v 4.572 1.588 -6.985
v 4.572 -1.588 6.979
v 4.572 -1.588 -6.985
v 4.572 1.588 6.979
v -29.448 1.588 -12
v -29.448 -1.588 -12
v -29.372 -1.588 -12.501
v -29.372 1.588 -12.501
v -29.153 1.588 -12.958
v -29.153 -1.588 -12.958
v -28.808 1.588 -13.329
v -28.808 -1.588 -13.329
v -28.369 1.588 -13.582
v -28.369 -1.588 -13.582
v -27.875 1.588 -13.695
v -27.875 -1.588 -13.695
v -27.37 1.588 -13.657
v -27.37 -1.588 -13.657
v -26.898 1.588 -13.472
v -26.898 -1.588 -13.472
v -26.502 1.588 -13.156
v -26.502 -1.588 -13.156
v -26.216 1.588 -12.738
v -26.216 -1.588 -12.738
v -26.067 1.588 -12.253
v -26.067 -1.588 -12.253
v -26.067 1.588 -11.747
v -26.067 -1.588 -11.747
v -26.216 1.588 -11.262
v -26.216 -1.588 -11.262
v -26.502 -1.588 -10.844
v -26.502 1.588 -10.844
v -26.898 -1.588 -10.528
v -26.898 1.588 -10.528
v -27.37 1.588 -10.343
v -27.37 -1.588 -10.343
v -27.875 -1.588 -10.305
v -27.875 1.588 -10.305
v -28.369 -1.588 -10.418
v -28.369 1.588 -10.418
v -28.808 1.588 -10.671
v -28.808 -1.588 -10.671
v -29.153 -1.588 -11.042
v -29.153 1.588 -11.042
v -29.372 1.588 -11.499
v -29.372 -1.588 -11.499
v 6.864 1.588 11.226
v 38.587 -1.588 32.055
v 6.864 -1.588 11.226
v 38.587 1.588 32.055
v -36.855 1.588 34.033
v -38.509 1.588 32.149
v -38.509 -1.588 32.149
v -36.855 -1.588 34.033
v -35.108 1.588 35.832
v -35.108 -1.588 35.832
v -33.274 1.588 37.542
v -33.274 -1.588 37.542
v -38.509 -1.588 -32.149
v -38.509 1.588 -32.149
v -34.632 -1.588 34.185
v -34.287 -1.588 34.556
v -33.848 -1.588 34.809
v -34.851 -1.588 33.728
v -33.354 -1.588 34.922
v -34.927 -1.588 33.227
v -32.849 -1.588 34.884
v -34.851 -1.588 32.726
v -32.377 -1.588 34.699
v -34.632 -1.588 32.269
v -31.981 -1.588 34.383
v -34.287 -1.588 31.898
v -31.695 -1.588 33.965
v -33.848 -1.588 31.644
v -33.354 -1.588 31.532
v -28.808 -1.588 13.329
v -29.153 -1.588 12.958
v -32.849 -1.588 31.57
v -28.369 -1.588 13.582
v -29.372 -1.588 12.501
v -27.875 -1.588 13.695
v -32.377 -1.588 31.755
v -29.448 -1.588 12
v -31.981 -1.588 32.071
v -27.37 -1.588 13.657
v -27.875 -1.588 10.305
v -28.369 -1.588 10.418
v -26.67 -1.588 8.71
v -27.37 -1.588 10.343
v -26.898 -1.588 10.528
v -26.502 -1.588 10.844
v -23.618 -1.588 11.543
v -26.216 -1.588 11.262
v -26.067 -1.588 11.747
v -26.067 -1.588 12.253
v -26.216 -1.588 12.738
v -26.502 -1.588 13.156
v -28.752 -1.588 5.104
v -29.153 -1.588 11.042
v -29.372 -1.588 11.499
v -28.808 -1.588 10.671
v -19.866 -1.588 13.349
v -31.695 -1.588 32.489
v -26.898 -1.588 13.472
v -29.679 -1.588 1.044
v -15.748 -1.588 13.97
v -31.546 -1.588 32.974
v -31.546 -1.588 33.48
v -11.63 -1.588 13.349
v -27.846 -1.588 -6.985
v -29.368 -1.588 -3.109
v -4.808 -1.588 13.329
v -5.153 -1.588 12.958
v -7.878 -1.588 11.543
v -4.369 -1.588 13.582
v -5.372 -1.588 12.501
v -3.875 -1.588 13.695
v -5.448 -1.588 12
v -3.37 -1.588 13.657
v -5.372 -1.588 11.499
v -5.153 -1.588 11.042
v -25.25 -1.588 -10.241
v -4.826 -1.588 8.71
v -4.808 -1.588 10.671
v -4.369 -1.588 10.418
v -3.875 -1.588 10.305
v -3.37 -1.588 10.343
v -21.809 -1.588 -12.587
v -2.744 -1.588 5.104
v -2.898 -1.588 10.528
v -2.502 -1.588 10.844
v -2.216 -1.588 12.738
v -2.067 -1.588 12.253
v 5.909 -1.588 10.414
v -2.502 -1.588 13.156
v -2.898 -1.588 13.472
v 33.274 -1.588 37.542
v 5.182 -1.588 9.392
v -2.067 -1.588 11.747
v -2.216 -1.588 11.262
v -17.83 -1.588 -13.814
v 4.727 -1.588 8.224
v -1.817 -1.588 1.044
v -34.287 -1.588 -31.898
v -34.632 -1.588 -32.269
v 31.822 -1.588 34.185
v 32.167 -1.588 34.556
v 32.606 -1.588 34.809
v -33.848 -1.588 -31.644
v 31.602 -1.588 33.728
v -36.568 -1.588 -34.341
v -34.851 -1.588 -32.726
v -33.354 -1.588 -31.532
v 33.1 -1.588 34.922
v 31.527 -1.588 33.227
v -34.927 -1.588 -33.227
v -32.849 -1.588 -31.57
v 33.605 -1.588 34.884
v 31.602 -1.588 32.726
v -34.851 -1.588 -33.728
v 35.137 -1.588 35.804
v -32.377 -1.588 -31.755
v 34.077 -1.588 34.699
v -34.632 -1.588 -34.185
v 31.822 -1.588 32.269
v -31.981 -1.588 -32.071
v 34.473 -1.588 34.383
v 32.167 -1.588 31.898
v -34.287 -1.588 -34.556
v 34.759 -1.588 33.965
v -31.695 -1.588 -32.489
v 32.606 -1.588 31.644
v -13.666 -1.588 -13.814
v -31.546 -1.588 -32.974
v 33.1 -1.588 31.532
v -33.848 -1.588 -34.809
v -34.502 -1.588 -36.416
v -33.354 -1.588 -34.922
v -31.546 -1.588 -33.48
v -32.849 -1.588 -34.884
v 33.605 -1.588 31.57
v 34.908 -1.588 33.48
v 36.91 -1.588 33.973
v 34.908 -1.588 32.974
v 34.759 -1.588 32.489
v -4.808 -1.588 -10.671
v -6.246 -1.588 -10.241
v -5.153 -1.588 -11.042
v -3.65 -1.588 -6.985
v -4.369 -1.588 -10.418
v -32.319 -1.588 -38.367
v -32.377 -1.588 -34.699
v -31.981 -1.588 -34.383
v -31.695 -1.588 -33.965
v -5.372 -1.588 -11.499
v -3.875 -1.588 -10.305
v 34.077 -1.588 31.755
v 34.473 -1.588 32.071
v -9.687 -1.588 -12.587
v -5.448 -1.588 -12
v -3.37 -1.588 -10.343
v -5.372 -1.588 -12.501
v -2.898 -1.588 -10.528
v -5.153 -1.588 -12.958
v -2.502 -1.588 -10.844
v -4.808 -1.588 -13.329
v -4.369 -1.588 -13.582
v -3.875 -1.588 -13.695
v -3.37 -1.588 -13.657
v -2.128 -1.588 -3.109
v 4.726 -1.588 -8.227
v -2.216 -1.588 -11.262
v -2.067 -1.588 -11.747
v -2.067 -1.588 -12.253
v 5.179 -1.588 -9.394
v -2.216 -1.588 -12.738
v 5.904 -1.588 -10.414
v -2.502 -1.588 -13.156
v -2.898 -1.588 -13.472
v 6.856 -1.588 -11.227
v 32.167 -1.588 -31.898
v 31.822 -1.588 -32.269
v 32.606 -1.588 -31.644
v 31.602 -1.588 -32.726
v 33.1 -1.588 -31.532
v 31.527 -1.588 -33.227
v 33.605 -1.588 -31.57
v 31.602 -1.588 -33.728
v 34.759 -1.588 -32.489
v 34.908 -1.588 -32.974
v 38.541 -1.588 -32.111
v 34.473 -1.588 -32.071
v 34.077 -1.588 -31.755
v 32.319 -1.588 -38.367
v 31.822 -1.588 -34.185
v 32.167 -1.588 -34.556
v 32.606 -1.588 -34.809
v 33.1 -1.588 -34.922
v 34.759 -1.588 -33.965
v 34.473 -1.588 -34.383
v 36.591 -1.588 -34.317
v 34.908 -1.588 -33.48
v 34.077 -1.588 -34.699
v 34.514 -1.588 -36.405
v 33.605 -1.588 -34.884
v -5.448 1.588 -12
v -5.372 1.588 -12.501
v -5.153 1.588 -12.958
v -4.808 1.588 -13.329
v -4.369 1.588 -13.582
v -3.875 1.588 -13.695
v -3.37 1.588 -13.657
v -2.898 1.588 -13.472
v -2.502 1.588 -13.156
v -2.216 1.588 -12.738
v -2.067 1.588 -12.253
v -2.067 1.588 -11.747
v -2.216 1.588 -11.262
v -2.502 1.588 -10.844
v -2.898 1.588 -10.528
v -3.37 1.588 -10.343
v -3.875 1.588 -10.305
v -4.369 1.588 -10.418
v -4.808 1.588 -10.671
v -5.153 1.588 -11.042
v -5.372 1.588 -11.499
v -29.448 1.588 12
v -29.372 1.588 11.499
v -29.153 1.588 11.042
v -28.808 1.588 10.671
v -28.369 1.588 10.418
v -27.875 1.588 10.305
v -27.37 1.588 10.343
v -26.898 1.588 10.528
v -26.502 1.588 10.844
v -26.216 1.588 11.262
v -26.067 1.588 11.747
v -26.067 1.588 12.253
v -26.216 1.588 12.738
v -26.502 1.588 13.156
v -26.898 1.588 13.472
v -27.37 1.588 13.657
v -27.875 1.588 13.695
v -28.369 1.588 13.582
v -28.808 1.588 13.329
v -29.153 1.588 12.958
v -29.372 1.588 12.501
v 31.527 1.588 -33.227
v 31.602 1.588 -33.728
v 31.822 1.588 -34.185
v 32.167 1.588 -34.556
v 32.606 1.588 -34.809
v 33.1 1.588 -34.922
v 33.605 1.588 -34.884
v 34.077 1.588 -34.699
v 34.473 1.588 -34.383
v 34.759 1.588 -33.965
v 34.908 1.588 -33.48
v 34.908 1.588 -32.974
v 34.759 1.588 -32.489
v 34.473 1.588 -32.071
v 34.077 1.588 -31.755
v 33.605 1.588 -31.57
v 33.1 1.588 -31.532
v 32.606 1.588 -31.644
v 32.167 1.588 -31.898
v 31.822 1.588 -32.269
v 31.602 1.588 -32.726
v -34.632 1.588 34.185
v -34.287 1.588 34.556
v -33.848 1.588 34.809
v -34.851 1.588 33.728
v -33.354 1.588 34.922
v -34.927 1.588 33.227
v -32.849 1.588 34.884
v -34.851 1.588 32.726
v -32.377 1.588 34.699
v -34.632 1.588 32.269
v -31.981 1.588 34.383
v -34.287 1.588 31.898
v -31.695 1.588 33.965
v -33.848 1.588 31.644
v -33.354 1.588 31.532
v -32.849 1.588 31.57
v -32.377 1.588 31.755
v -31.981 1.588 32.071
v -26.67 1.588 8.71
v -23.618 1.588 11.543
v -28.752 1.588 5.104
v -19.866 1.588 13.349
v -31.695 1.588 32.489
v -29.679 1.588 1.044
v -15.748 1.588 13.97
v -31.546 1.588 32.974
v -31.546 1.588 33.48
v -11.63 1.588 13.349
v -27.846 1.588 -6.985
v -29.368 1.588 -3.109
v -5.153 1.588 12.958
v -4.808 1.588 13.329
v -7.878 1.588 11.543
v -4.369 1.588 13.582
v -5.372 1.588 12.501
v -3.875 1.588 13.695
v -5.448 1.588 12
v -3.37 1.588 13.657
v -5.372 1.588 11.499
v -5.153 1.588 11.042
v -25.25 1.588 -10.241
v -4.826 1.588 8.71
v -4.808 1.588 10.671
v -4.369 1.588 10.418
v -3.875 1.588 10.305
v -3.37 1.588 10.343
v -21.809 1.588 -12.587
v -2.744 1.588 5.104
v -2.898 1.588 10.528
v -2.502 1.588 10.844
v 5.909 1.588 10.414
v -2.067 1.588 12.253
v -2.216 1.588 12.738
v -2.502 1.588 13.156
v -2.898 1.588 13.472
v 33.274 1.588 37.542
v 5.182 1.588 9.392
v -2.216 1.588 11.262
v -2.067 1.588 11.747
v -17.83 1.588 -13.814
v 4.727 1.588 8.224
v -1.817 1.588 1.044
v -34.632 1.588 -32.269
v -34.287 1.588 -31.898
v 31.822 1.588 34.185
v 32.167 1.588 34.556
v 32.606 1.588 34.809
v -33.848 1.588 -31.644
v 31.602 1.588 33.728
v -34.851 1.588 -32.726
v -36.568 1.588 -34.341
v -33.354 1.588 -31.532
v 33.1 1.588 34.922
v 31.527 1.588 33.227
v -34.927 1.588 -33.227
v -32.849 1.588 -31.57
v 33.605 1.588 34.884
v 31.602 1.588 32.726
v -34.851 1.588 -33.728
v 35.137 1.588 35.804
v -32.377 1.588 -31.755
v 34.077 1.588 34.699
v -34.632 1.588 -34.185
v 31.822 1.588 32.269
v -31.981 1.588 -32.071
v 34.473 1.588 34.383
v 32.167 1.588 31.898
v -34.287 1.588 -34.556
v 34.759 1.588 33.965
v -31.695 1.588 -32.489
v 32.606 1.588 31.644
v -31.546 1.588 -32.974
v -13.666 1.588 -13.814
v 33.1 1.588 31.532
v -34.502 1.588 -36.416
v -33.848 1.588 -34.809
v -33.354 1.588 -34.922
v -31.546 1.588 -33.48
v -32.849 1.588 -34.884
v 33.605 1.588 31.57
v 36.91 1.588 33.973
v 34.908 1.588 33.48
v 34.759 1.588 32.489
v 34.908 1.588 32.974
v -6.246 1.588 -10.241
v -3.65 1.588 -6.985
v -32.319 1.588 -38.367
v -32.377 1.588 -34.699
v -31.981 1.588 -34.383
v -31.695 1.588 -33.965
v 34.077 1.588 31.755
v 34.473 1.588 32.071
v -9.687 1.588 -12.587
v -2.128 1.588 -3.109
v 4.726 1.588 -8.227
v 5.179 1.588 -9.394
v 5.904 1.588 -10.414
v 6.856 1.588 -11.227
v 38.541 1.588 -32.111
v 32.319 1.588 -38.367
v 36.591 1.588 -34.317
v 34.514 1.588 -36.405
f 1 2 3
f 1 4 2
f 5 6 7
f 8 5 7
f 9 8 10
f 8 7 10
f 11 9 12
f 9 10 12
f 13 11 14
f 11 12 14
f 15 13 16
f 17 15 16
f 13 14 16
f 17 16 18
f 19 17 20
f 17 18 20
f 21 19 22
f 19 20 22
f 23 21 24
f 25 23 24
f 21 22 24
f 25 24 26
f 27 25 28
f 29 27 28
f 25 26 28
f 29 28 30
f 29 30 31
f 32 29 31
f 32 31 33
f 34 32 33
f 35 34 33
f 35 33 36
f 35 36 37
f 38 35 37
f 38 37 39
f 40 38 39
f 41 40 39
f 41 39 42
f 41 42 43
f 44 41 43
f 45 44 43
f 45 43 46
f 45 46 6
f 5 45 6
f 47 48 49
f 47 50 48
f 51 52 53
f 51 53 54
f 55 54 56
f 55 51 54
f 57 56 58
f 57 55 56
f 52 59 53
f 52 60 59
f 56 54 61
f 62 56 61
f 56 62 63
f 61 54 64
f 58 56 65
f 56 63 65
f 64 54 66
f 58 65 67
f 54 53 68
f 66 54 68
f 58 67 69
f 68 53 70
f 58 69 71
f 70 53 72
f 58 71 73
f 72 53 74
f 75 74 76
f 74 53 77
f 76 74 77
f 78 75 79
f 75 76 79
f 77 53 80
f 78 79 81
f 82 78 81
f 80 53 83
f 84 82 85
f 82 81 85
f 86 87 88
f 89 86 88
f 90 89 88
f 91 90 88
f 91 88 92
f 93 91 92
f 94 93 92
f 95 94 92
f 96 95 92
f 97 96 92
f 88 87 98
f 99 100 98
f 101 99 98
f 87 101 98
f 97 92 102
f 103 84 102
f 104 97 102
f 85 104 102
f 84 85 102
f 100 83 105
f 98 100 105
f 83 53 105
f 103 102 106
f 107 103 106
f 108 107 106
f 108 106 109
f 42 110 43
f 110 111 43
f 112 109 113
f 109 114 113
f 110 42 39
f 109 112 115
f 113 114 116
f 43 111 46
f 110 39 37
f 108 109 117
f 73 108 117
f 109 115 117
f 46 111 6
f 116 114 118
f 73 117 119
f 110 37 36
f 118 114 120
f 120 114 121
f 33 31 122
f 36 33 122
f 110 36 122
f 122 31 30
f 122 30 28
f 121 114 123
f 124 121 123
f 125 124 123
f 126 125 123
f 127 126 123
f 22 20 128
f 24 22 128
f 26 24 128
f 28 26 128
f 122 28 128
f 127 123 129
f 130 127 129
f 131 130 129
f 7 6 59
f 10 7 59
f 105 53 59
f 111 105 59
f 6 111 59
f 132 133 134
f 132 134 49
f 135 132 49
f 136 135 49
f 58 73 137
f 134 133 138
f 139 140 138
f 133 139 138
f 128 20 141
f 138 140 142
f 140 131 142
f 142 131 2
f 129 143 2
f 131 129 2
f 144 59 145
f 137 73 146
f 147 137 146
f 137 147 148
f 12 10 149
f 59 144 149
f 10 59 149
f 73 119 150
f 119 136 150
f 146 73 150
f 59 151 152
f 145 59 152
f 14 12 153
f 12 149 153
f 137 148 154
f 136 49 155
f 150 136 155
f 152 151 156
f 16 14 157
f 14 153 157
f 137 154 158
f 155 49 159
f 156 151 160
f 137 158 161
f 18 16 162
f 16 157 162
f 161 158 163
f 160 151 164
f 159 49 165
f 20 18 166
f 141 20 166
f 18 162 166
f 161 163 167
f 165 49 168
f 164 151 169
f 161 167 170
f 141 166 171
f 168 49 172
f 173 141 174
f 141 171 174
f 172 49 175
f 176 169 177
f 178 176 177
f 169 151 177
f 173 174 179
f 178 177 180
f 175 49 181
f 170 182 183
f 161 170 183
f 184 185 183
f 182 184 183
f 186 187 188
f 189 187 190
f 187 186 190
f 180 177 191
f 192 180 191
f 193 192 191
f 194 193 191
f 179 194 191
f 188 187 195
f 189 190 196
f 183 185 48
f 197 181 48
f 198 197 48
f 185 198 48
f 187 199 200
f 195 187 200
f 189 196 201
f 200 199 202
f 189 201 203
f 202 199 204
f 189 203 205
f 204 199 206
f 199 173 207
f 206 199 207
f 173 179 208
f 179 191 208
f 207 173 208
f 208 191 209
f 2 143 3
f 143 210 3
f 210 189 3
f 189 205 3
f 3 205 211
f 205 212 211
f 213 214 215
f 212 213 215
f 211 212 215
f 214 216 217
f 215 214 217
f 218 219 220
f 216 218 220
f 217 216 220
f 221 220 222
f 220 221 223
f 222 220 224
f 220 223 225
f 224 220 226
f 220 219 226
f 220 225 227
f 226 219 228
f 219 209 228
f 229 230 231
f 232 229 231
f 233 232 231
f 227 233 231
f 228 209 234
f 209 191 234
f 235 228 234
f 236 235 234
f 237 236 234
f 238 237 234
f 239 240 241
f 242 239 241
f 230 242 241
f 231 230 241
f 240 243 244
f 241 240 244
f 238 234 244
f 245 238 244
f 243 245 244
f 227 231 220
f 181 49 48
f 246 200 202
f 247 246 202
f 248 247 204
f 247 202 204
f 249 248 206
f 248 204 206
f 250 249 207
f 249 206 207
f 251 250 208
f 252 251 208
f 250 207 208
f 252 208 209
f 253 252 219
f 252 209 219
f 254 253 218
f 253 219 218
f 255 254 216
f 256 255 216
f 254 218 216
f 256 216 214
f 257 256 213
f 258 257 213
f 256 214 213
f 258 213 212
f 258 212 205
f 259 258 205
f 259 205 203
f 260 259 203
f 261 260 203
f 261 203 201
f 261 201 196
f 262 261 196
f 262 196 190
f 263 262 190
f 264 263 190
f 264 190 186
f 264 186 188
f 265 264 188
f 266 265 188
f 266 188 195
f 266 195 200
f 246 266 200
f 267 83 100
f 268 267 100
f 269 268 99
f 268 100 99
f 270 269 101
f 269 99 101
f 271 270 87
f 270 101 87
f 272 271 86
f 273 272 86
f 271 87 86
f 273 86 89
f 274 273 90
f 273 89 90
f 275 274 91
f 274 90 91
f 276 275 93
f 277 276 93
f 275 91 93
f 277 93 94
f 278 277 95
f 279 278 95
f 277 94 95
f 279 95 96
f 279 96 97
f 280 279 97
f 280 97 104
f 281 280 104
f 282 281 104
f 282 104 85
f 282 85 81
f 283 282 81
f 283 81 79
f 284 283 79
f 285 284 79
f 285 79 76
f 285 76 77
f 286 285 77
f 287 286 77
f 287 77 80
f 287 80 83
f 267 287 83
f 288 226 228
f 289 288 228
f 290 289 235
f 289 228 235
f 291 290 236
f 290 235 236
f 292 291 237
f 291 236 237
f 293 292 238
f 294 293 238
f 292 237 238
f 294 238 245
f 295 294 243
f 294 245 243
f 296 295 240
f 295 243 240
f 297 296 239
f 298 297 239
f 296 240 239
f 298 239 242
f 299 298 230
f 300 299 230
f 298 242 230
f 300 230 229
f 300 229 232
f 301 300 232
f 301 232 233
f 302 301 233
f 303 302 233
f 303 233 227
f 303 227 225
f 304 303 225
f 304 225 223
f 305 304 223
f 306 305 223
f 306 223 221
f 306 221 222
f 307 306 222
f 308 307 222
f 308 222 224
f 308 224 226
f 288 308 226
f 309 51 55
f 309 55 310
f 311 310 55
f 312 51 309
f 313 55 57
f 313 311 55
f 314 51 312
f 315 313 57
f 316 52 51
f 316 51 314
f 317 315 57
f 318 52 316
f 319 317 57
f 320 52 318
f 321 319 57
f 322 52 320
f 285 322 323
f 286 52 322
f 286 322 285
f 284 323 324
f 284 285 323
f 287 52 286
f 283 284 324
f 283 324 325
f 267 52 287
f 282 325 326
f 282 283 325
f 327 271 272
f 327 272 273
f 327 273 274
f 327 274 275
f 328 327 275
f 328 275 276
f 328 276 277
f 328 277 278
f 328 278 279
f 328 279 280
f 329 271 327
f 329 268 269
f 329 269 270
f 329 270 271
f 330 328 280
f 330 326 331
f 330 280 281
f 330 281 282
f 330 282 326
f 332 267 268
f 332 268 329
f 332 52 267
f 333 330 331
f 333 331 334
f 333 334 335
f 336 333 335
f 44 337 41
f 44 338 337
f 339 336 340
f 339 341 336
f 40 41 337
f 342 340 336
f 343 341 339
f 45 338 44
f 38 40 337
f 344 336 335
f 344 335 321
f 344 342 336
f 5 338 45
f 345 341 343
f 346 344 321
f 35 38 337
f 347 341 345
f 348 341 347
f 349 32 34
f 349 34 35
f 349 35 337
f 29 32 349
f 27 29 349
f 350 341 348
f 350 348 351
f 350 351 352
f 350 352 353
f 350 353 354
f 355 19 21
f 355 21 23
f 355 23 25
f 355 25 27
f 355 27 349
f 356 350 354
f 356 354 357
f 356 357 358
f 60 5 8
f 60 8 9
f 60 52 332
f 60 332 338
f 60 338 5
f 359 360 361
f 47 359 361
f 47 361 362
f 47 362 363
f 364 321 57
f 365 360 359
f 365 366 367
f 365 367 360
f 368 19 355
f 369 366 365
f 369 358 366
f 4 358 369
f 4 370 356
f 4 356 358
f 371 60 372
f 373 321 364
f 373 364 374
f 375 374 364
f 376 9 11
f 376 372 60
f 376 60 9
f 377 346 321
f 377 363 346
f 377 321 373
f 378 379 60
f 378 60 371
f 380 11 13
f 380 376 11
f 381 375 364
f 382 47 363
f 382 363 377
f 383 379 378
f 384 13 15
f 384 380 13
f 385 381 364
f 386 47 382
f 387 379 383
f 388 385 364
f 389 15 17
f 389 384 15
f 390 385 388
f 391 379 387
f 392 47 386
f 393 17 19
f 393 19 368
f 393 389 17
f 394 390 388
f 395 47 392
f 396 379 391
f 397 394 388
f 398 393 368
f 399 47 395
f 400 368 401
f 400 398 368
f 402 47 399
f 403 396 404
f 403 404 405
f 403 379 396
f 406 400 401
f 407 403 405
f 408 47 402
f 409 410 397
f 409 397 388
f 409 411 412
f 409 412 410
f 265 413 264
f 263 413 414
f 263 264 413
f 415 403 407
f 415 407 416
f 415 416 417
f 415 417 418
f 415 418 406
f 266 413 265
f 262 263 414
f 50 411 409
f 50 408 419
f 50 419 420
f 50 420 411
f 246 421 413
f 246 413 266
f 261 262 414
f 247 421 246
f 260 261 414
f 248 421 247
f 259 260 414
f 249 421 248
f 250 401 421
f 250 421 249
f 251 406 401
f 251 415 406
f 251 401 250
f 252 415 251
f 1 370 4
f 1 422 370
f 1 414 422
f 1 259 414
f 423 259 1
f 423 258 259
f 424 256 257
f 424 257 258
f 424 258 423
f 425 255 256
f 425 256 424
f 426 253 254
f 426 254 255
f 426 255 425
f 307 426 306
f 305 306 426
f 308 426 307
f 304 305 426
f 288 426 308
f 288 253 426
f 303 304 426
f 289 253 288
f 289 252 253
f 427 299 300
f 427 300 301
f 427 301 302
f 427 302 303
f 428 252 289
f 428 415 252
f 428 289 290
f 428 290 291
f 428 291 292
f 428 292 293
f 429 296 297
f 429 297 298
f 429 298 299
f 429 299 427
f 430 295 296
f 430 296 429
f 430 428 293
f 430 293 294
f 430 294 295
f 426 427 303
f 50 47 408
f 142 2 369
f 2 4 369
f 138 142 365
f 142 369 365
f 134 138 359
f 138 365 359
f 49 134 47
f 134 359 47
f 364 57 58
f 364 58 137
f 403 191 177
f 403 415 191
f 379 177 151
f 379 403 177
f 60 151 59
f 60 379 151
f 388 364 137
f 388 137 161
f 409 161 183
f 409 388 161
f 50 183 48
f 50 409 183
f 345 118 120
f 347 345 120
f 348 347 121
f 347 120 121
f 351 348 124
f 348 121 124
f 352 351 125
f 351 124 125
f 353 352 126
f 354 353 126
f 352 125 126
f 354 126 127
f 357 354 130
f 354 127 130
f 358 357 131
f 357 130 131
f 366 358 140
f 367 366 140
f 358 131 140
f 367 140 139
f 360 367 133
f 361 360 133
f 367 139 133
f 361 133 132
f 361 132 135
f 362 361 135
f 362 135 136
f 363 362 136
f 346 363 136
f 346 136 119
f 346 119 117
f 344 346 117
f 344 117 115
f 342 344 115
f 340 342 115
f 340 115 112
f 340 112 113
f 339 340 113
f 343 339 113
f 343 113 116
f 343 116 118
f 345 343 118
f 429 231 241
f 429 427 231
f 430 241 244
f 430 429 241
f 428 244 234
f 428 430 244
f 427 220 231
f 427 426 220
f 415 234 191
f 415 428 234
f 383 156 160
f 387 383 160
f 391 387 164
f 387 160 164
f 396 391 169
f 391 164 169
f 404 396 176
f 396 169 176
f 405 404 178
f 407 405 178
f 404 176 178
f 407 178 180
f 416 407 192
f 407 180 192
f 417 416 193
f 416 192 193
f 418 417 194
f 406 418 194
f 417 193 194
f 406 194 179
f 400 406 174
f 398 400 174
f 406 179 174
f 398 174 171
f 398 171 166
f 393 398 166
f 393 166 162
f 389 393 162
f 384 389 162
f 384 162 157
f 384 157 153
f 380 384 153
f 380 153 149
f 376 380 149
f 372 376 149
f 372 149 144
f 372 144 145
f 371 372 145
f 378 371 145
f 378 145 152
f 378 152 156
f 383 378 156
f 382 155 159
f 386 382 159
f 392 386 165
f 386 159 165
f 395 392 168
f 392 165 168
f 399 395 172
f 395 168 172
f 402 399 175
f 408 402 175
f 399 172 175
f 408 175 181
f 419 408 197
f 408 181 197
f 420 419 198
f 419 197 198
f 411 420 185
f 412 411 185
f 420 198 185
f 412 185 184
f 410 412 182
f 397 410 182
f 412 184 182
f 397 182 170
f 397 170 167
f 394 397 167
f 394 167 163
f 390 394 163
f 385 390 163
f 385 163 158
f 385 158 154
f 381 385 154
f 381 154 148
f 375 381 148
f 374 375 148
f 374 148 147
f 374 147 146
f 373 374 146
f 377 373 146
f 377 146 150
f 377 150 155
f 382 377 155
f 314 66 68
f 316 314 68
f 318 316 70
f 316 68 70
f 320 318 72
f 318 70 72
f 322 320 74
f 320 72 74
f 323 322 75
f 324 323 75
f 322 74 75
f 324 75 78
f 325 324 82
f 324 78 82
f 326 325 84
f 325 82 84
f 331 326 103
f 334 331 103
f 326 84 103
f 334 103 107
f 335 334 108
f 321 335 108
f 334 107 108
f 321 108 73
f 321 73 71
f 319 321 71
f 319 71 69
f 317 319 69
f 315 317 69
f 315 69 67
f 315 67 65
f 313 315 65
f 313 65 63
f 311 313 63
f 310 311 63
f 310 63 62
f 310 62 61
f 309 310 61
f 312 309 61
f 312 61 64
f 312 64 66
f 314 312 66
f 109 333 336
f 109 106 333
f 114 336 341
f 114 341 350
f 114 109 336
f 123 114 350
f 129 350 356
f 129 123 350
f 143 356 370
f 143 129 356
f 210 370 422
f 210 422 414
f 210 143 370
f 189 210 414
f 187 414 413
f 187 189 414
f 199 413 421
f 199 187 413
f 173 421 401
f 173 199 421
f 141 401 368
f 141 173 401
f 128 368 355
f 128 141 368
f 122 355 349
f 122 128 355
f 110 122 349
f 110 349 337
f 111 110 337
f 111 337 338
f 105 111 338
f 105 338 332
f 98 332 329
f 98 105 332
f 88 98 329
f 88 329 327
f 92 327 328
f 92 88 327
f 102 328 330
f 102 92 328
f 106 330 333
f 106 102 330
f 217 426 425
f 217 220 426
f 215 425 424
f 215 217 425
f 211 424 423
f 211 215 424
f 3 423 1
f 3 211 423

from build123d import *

# Parameters (mm, degrees)
SKETCH1_R            = 13.97
BOSS_EXTRUDE1_DEPTH  = 1.5875
FILLET1_R            = 5.08
M3_CLEARANCE_HOLE1_D = 3.4
M3_CLEARANCE_HOLE2_D = 3.4


with BuildPart() as part:
    # Sketch1 → Boss-Extrude1 (new, symmetric)
    with BuildSketch(Plane(origin=(0, 0, 0), x_dir=(1, 0, 0), z_dir=(0, 1, 0))):
        with BuildLine():
            Line((-38.50947489, 32.14883464), (-38.50947489, -32.14883464))
            ThreePointArc((-38.50947489, -32.14883464), (-35.992876625, -34.943383598), (-33.274, -37.541552299))
            Line((-33.274, -37.541552299), (33.274, -37.541552299))
            ThreePointArc((33.274, -37.541552299), (36.035191498, -34.899744966), (38.587271968, -32.055415565))
            Line((38.587271968, -32.055415565), (4.572, -9.720985565))
            Line((4.572, -9.720985565), (4.572, 9.720985565))
            Line((4.572, 9.720985565), (38.541369471, 32.110591154))
            ThreePointArc((38.541369471, 32.110591154), (35.567819018, 35.375944868), (32.318597457, 38.367114609))
            Line((32.318597457, 38.367114609), (-32.318597457, 38.367114609))
            ThreePointArc((-32.318597457, 38.367114609), (-35.55025611, 35.393594272), (-38.50947489, 32.14883464))
        make_face()
        with Locations(Location((-15.748, 0, 0), (0, 0, 270))):
            Circle(SKETCH1_R, mode=Mode.SUBTRACT)
    extrude(amount=BOSS_EXTRUDE1_DEPTH, both=True)

    # Fillet1
    fillet1_edges = [part.edges().sort_by_distance(p)[0] for p in [
        (4.572, 0, -9.720985565),
        (4.572, 0, 9.720985565),
    ]]
    fillet(fillet1_edges, radius=FILLET1_R)

    # M3 Clearance Hole1 (through all)
    with Locations(Plane(origin=(0, 1.5875, 0), x_dir=(1, 0, 0), z_dir=(0, 1, 0))):
        with Locations((-33.226947648, 33.226947648), (33.226947648, 33.226947648), (33.226947648, -33.226947648), (-33.226947648, -33.226947648)):
            Hole(M3_CLEARANCE_HOLE1_D / 2)

    # M3 Clearance Hole2 (through all)
    with Locations(Plane(origin=(0, 1.5875, 0), x_dir=(1, 0, 0), z_dir=(0, 1, 0))):
        with Locations((-27.748, 12), (-3.748, 12), (-3.748, -12), (-27.748, -12)):
            Hole(M3_CLEARANCE_HOLE2_D / 2)


solid = part.part
